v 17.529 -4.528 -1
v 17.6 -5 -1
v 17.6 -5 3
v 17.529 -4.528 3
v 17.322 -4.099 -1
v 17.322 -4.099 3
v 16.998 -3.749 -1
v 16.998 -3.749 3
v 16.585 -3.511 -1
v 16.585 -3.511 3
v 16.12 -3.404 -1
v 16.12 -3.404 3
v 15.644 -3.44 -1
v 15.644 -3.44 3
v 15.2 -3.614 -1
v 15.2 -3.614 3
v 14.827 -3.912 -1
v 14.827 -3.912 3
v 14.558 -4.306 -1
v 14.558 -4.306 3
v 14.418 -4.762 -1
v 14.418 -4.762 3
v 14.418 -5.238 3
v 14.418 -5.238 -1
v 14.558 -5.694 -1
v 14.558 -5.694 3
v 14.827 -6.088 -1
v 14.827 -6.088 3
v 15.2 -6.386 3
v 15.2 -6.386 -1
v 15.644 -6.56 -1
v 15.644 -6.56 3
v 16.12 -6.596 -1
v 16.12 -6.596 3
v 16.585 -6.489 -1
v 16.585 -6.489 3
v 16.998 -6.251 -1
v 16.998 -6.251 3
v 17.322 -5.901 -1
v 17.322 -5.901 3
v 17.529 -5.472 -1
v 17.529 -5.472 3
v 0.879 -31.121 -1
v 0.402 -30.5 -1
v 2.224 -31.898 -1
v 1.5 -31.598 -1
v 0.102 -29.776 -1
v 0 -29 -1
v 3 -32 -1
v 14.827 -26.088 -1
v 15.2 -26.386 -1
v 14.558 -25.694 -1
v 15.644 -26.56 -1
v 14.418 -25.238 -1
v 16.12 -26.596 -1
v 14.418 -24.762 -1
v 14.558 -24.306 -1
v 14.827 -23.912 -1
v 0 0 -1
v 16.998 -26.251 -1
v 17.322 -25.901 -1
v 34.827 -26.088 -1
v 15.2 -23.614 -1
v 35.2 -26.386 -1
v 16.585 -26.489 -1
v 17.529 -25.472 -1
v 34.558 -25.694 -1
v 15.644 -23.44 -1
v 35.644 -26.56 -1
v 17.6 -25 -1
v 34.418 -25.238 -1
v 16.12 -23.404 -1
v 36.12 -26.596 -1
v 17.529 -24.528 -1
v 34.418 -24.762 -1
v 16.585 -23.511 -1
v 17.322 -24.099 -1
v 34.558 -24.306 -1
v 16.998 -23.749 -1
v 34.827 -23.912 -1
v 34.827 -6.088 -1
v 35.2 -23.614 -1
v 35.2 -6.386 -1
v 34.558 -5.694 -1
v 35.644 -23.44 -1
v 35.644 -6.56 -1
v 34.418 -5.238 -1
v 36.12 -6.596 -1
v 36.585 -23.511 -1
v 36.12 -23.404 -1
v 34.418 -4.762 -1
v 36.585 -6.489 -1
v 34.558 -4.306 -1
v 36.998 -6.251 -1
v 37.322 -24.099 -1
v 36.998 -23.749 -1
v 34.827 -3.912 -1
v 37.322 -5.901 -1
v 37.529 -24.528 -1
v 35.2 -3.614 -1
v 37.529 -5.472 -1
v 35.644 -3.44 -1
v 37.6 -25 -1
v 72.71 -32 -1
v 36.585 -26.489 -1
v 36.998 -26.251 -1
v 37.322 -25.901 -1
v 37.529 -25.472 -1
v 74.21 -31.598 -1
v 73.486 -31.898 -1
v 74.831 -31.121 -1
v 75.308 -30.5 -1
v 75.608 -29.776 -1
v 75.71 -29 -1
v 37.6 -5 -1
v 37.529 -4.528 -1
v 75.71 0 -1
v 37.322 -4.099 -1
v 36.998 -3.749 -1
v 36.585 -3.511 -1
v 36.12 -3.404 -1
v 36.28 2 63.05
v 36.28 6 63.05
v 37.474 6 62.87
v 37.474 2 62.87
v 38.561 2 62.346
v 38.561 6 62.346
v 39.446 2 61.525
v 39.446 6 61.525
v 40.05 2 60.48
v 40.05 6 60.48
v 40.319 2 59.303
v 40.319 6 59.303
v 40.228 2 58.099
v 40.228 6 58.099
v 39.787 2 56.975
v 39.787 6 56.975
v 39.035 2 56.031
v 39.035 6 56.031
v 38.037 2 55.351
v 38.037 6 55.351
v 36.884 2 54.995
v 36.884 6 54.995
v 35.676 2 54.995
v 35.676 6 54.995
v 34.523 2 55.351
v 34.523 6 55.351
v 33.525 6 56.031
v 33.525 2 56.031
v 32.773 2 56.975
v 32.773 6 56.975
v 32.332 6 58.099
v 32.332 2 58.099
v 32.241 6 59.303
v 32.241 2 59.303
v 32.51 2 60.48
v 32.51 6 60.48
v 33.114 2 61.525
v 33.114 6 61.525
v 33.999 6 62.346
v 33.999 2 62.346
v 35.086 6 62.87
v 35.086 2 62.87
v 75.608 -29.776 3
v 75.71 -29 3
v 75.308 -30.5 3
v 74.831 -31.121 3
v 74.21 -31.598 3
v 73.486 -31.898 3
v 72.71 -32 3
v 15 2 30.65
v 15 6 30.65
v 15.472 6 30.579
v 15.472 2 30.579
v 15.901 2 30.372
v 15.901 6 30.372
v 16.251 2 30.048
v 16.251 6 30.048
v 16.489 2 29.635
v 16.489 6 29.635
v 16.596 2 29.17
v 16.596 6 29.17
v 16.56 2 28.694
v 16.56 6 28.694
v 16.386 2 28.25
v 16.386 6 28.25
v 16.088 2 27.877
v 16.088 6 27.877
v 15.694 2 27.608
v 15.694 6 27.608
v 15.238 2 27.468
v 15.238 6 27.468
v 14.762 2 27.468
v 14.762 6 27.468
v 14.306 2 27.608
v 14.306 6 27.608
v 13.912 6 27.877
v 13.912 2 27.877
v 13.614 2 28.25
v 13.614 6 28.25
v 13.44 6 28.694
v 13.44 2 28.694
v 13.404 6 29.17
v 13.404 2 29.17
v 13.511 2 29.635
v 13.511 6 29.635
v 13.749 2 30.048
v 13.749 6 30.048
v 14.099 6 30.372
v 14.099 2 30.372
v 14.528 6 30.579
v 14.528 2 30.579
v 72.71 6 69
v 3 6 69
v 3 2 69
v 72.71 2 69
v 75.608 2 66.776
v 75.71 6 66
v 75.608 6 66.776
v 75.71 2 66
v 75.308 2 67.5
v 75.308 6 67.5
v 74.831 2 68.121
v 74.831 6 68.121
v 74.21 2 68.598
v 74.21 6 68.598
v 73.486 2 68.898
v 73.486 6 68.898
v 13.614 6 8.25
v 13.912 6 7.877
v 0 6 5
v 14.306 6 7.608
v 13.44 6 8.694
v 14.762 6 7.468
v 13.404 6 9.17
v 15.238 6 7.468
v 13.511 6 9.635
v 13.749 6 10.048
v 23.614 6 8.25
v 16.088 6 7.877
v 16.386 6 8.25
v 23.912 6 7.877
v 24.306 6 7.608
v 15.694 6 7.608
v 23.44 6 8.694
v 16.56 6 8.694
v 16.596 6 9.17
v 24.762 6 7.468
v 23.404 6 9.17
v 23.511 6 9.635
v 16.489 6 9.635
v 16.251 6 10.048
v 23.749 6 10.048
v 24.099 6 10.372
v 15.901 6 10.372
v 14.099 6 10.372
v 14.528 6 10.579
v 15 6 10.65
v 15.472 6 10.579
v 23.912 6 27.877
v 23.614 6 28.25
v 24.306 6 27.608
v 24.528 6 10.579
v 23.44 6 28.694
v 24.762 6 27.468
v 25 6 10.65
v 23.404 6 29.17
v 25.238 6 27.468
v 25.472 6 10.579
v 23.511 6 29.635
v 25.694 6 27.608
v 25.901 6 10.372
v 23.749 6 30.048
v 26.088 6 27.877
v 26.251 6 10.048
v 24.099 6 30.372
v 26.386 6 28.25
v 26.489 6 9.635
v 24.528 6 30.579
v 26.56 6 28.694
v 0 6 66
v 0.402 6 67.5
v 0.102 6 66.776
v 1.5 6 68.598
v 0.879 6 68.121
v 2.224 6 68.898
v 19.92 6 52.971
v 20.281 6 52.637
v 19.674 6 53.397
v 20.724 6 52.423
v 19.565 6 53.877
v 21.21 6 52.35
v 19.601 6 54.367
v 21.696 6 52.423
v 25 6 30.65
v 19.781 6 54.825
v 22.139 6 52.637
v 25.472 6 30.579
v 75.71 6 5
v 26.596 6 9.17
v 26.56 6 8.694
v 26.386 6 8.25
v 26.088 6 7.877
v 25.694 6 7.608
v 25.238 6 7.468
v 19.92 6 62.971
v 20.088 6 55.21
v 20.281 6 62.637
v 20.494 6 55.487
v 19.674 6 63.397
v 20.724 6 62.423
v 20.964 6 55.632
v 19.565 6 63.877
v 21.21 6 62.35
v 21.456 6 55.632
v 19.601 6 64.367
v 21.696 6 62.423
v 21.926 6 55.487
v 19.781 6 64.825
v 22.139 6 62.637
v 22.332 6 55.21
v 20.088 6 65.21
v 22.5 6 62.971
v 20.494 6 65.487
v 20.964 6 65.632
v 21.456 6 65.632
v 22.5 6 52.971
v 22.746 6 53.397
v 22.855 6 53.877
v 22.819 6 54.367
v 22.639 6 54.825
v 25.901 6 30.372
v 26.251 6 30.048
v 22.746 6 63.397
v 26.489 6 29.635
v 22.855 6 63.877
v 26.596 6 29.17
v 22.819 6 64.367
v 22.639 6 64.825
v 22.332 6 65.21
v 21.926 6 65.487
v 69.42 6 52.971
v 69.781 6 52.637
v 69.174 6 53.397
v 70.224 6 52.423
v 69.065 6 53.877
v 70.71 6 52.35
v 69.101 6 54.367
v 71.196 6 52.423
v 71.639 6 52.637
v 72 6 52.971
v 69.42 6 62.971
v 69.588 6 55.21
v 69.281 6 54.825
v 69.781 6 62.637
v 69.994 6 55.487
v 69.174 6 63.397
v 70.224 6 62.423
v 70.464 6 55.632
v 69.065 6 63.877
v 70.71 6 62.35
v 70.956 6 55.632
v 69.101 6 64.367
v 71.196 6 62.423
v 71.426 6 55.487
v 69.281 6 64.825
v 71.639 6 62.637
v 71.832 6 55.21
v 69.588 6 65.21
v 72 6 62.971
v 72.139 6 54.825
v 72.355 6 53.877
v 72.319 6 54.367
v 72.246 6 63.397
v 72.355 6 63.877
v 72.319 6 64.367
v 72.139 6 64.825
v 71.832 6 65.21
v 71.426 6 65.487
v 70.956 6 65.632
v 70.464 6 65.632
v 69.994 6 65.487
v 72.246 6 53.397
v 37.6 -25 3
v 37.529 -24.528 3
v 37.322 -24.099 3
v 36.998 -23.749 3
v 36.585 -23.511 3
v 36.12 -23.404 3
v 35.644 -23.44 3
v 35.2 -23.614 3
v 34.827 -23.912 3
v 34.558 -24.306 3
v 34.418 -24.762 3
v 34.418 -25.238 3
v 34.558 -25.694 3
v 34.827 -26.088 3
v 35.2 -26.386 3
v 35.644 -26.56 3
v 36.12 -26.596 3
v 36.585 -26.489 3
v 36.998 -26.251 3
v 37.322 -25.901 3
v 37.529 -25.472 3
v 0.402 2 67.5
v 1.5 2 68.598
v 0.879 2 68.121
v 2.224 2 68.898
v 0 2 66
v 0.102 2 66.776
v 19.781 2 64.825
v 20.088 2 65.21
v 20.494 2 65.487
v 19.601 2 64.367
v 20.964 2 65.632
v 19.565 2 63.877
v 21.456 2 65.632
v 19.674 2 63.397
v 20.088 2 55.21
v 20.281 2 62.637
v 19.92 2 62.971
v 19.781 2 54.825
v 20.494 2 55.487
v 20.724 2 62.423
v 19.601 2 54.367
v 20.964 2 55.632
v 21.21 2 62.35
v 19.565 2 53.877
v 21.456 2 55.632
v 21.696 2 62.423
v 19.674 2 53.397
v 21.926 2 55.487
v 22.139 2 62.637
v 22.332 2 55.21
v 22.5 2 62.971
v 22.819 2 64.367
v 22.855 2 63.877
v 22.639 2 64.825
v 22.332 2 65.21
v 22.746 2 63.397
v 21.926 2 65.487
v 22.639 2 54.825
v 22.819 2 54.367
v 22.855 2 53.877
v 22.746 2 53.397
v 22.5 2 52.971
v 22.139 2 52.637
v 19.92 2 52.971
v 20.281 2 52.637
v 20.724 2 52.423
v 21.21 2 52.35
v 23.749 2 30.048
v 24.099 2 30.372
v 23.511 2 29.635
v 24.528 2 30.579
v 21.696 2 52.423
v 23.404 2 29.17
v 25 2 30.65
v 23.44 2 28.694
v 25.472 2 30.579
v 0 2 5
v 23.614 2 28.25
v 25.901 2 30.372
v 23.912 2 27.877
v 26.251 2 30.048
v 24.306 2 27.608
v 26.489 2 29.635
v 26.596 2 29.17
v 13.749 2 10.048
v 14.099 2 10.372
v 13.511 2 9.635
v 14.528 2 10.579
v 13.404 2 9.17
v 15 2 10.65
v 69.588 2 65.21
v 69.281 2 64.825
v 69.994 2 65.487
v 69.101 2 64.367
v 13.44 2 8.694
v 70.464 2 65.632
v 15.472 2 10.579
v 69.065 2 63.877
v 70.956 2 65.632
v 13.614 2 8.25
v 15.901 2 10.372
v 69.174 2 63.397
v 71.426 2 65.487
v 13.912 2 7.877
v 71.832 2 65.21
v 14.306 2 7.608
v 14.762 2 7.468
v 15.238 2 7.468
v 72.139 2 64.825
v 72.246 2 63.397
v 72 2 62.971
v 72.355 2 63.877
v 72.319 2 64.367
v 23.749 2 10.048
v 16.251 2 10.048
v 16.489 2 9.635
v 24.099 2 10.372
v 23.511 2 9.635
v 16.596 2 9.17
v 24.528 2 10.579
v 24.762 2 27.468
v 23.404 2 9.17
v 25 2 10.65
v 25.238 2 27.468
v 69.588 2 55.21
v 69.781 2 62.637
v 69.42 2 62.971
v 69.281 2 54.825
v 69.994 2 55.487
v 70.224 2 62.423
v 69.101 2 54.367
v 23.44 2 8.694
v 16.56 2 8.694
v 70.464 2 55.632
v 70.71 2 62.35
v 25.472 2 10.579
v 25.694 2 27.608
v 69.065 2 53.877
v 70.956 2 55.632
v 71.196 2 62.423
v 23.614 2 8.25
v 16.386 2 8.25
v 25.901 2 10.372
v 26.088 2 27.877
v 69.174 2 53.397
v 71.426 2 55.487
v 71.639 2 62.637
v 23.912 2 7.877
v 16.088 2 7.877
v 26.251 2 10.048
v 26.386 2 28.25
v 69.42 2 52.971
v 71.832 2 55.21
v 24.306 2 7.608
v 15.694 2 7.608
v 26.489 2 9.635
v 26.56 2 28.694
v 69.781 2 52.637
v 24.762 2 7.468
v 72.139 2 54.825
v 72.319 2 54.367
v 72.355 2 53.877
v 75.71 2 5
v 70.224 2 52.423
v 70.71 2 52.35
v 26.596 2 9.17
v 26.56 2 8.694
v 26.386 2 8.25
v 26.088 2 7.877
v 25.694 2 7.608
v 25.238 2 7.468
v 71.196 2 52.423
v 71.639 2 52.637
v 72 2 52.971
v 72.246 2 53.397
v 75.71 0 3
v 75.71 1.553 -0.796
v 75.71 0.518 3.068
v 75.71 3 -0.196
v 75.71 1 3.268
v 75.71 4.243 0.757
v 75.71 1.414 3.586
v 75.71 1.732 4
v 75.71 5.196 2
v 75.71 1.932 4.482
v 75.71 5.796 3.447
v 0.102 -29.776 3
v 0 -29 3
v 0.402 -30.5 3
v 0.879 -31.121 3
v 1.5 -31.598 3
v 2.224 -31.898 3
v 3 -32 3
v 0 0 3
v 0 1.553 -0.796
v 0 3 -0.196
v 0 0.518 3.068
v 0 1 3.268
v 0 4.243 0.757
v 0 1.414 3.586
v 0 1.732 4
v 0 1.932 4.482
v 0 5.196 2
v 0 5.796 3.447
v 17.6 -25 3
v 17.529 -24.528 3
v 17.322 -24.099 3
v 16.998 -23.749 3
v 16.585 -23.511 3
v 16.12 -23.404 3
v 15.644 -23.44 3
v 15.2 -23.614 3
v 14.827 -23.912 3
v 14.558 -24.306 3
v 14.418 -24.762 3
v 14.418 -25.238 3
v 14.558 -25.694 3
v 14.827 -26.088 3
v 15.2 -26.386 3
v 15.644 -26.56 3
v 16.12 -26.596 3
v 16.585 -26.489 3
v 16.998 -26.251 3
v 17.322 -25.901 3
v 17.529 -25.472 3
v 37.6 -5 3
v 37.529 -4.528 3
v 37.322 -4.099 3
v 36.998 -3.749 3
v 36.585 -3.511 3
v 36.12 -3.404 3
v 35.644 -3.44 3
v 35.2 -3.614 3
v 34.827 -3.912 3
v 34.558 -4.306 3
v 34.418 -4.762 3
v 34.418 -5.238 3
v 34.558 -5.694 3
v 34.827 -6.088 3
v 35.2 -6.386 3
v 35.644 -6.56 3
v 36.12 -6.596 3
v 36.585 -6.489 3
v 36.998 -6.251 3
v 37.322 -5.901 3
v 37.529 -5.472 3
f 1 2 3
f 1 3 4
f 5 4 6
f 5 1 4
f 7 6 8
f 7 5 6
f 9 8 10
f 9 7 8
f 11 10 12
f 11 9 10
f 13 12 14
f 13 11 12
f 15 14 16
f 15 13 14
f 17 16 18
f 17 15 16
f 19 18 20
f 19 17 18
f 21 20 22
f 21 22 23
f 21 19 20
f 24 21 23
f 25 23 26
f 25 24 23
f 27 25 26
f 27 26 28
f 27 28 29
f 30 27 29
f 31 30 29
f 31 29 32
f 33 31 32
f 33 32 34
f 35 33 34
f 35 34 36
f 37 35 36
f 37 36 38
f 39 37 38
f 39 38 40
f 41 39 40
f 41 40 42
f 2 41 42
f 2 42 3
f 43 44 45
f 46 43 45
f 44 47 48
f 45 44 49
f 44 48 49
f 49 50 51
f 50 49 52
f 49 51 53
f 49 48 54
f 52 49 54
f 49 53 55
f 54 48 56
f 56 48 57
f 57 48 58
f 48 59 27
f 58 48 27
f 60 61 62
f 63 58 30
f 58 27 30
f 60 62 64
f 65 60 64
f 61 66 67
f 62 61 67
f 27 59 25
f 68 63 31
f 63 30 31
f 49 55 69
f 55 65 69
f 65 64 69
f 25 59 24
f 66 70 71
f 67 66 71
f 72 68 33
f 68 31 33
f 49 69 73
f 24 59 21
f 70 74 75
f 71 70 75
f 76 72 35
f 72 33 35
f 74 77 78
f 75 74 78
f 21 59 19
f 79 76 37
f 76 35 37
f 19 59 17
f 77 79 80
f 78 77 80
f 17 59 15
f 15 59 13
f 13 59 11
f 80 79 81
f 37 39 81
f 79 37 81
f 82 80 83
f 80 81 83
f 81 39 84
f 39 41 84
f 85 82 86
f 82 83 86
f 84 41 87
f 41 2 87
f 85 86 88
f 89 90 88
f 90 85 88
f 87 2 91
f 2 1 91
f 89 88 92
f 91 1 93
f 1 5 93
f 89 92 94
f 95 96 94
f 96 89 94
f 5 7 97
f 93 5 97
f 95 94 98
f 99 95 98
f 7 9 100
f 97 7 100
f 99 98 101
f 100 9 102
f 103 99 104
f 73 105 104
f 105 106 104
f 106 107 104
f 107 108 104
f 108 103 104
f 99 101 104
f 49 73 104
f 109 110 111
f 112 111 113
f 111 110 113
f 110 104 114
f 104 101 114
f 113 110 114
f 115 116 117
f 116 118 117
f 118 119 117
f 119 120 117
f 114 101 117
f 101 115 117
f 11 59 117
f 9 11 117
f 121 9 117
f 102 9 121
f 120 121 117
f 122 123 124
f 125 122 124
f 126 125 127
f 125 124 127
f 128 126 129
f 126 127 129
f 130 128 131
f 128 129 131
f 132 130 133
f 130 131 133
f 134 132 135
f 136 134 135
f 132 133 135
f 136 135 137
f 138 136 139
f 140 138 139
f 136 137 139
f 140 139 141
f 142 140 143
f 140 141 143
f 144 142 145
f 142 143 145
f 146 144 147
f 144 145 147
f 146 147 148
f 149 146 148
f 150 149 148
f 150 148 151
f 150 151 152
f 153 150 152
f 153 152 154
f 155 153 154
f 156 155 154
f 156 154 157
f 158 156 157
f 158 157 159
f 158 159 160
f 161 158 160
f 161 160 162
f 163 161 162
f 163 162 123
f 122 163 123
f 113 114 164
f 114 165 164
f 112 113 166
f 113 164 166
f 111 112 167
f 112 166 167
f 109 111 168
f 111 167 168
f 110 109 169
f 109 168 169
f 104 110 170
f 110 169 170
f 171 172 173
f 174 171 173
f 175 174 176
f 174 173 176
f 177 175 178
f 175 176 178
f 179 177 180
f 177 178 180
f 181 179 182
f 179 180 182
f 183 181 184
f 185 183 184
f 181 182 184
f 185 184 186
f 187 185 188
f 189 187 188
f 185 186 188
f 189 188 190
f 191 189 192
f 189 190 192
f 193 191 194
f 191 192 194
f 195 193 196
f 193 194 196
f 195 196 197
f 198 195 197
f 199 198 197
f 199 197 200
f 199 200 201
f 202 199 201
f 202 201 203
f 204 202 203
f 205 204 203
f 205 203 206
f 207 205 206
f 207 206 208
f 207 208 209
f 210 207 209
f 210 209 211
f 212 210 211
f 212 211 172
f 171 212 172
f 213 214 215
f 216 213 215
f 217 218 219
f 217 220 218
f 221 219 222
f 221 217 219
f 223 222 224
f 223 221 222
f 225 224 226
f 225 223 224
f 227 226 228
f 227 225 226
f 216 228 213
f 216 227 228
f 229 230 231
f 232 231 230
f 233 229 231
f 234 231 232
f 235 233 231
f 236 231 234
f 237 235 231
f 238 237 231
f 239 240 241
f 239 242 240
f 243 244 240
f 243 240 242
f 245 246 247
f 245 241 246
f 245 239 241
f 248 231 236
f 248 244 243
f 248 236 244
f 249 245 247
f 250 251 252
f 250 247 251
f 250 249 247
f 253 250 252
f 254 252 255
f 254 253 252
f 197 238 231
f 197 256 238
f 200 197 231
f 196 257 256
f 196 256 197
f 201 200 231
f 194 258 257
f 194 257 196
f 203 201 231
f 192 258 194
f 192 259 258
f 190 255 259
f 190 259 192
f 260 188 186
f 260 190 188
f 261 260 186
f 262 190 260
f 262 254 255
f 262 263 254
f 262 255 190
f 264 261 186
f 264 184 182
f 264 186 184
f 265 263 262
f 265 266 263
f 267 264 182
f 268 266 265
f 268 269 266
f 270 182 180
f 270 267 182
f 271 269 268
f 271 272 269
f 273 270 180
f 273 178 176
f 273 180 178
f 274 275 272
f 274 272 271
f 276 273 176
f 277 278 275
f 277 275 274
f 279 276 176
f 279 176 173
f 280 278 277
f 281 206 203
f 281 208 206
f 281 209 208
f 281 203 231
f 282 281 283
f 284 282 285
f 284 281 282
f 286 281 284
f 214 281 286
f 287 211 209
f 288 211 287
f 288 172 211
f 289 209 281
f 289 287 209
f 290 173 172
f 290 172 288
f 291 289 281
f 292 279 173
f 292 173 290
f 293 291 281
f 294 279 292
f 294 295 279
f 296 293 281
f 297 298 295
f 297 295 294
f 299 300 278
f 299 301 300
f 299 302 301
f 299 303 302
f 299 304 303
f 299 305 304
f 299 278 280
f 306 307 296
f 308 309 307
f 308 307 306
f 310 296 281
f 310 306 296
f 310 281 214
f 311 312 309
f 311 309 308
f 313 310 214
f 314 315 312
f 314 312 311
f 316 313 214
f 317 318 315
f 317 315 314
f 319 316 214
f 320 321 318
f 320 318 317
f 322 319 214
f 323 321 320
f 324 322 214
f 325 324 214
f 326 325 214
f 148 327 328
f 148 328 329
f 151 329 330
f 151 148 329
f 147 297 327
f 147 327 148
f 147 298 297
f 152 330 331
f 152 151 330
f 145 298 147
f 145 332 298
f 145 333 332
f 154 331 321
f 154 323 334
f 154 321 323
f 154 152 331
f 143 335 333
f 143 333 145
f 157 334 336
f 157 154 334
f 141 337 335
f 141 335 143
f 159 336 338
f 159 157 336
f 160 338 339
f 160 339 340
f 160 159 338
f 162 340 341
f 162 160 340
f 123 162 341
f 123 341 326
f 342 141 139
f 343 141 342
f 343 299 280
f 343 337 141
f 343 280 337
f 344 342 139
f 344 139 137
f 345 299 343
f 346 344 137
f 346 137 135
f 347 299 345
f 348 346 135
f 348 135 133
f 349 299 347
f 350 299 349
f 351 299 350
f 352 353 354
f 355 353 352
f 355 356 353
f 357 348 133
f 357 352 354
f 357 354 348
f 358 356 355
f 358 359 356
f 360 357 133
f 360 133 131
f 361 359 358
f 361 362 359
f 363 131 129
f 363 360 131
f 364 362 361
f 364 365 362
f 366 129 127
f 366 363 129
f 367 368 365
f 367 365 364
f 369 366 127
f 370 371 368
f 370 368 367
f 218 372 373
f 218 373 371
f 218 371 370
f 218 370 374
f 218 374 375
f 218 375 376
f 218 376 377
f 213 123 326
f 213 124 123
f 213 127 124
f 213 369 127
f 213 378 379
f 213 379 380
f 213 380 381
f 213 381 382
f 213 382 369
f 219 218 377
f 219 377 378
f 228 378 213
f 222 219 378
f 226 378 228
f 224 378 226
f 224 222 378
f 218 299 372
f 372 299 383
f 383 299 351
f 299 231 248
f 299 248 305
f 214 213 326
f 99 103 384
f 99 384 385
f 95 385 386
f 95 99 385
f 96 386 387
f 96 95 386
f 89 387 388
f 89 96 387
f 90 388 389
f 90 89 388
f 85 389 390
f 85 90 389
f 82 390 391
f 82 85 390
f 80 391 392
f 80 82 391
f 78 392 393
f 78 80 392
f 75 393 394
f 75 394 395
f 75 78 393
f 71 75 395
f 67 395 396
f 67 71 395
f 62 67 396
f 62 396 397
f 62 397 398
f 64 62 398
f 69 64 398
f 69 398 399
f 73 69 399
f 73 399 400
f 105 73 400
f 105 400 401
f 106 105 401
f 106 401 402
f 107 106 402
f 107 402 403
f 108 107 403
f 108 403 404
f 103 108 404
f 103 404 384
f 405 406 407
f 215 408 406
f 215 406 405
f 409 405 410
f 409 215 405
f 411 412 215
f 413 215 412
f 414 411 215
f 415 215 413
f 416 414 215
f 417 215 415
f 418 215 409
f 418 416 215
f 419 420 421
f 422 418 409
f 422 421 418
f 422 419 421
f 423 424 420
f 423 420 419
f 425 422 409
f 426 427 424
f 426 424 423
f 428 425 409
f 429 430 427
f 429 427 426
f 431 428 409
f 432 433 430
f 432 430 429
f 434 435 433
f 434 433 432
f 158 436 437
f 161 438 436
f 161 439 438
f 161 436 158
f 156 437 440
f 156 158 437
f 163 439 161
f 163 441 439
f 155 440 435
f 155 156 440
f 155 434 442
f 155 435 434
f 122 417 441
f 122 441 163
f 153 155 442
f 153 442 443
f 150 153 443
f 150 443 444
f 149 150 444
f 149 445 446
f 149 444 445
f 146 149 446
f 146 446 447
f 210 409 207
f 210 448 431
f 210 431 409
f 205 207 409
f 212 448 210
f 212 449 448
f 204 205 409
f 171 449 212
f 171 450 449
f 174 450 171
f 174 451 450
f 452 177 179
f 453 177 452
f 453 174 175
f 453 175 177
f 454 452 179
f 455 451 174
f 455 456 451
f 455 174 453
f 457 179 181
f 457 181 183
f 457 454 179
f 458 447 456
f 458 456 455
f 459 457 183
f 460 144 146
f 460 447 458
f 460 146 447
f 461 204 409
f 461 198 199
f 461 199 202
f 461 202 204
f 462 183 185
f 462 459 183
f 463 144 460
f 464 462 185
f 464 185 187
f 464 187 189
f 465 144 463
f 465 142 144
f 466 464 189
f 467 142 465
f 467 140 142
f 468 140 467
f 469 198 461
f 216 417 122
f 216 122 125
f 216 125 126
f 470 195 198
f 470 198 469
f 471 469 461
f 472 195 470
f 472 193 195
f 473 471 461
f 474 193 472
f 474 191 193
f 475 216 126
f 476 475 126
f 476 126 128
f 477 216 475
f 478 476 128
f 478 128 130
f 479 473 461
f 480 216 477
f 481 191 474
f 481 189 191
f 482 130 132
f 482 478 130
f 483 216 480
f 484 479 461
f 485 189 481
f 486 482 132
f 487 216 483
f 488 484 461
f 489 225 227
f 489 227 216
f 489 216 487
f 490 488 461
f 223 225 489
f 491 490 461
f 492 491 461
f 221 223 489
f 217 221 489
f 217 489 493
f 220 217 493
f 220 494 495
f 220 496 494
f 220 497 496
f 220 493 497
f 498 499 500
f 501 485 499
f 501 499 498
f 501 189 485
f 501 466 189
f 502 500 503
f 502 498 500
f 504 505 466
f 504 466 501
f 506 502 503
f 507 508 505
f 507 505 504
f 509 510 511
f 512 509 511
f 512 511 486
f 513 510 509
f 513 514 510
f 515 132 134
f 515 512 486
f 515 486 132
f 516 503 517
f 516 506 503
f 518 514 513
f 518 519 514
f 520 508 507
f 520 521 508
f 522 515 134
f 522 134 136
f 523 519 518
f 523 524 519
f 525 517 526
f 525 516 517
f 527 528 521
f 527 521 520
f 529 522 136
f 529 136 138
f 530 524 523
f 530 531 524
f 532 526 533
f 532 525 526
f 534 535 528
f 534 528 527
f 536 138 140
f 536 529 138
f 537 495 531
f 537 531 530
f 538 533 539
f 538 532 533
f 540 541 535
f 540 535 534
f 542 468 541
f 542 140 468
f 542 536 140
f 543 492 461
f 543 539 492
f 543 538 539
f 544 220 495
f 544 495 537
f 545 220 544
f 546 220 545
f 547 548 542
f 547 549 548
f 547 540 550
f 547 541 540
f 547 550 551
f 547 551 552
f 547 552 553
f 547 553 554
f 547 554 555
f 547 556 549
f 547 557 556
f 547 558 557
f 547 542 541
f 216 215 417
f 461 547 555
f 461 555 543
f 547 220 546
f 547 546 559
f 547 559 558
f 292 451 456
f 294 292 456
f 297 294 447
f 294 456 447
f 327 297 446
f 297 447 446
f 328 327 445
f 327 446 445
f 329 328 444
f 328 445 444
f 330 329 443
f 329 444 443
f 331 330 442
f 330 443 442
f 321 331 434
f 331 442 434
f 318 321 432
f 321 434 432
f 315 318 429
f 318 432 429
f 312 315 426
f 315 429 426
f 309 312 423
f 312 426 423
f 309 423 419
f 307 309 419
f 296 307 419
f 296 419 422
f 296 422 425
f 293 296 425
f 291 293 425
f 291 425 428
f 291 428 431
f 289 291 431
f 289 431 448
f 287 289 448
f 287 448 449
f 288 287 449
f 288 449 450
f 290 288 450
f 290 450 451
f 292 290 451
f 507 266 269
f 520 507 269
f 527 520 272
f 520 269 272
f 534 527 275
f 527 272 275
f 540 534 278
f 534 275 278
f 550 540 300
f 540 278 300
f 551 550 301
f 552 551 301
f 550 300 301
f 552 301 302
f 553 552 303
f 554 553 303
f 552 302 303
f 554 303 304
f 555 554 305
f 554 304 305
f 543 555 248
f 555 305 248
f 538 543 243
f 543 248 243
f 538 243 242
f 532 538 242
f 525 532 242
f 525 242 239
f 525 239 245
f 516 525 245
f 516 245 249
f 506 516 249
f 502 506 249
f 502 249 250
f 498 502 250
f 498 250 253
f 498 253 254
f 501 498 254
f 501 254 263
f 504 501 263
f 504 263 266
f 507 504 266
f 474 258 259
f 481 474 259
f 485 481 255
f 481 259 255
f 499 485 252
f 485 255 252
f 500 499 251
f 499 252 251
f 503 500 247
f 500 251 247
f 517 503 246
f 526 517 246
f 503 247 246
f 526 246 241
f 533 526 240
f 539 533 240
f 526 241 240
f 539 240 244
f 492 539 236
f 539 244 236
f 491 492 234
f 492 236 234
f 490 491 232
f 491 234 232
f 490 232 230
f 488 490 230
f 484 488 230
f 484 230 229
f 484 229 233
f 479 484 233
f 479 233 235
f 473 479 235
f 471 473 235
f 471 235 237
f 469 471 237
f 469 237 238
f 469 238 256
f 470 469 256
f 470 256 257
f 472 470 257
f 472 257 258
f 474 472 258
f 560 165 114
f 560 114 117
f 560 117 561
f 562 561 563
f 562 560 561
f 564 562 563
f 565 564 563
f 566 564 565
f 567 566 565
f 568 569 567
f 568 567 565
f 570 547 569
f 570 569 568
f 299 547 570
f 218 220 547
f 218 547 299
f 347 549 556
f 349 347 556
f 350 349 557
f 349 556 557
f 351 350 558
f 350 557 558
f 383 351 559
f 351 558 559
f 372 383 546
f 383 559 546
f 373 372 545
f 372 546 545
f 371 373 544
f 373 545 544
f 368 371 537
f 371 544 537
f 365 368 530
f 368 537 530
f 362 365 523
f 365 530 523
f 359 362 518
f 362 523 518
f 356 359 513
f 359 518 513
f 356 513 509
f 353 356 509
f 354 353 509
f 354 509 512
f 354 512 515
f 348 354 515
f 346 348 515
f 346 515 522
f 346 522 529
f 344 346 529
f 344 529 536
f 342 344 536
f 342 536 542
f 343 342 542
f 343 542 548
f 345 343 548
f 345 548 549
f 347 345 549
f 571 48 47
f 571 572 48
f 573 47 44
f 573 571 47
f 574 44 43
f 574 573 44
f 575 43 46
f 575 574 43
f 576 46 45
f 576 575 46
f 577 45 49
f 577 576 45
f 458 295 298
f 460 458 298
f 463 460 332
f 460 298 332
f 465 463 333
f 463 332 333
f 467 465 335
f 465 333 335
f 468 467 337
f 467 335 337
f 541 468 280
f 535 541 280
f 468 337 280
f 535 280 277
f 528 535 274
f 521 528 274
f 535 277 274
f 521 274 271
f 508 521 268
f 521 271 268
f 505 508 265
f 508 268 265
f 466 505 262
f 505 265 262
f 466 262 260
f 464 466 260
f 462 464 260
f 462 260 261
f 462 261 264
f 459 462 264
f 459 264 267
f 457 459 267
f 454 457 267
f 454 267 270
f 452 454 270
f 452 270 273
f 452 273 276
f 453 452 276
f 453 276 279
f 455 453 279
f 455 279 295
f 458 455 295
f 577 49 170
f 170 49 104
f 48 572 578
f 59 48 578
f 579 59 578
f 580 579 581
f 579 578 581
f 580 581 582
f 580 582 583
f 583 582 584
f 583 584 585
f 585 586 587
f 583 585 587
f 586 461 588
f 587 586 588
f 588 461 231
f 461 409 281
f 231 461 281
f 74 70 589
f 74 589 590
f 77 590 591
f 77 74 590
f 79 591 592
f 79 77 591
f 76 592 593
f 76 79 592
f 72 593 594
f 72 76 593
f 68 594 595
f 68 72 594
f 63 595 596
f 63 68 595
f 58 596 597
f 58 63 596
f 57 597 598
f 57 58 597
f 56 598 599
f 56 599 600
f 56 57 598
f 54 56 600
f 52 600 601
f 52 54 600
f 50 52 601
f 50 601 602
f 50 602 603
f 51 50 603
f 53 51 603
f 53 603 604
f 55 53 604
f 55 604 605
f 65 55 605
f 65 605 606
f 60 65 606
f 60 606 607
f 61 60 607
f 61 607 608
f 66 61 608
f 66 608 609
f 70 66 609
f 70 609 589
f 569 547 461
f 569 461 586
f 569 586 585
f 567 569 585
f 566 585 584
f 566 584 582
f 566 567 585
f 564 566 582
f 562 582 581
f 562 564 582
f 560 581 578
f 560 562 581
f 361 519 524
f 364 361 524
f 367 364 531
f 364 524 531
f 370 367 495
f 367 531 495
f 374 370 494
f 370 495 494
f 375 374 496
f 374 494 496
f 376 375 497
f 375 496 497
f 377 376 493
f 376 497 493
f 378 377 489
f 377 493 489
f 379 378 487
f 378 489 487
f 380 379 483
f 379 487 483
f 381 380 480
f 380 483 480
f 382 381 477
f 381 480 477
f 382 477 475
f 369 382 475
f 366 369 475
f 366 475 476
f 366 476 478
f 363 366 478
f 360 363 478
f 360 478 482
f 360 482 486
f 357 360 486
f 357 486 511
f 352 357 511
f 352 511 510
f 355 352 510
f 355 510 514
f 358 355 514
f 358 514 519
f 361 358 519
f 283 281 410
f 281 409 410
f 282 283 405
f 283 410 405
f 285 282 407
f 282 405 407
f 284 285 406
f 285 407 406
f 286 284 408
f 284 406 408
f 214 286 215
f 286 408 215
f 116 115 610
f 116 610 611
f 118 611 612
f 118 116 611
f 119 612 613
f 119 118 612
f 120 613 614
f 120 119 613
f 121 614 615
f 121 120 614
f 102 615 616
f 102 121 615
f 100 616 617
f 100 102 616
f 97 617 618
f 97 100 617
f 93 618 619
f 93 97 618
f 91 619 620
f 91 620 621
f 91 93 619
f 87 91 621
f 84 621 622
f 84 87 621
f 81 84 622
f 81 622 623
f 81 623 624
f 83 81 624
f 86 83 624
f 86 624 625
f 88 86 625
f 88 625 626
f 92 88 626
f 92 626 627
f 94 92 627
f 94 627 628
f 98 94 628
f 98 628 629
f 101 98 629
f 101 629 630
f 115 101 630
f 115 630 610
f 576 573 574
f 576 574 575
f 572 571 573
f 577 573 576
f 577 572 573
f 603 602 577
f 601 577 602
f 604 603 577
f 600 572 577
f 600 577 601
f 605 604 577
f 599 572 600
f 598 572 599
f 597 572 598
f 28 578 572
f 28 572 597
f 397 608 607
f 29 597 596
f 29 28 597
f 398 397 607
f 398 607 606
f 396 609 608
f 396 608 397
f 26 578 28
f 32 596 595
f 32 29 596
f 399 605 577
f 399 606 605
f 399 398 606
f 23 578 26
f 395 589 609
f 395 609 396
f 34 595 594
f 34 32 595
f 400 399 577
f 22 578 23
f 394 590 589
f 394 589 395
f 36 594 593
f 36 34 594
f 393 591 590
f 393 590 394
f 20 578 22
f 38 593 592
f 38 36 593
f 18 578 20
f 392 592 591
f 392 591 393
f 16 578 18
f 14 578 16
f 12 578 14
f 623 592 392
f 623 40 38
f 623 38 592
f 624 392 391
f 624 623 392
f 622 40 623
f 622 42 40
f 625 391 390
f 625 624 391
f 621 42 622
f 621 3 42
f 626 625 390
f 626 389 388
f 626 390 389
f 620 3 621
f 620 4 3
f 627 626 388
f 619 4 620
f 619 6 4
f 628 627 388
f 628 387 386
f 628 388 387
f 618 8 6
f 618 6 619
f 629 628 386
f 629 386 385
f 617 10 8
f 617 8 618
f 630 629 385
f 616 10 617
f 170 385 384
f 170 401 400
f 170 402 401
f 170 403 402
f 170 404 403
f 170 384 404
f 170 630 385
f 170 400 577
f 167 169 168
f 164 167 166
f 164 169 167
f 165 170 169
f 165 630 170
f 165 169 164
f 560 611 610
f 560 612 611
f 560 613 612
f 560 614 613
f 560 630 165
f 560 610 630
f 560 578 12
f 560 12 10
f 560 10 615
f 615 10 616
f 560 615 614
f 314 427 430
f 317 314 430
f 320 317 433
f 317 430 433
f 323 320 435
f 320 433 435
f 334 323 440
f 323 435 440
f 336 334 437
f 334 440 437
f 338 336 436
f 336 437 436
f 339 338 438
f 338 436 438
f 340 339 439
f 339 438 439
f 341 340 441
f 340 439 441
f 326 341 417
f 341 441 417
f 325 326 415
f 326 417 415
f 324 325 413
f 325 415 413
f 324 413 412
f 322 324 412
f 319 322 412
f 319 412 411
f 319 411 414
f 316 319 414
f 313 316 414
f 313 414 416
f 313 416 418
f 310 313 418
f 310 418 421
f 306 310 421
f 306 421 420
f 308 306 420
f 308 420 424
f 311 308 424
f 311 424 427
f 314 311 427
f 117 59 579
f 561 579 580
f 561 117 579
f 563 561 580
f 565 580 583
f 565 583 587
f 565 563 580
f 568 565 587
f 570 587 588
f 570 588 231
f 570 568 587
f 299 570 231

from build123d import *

# Parameters (mm, degrees)
SKETCH_1_W              = 75.71
SKETCH_1_H              = 32
SKETCH_1_R              = 1.6
EXTRUDE_1_DEPTH         = 3
SHEET_START             = -1
SHEET_METAL_1_OUTLINE_W = 75.71
SHEET_METAL_1_OUTLINE_H = 32
SHEET_METAL_1_OUTLINE_R = 1.6
SHEET_METAL_1_DEPTH     = 1
SM_EDGE_FLANGE_1_DEPTH  = 75.71
SKETCH_26_R             = 4.05
SKETCH_26_R_2           = 1.6
CUT_EXTRUDE_1_DEPTH     = 10
FILLET_4_R              = 3
M4X0_7_1_D              = 3.3


# Read off the part's stored shape, not the designer's step: 轉換-實體1
# Sheet-metal steps are written as plain solids
with BuildPart() as part:
    # Sketch 1 → 填料-伸長1 (new body)
    with BuildSketch(Plane.XY):
        with Locations((37.855, -16)):
            Rectangle(SKETCH_1_W, SKETCH_1_H)
        with Locations((36, -5)):
            Circle(SKETCH_1_R, mode=Mode.SUBTRACT)
        with Locations((16, -5)):
            Circle(SKETCH_1_R, mode=Mode.SUBTRACT)
        with Locations((16, -25)):
            Circle(SKETCH_1_R, mode=Mode.SUBTRACT)
        with Locations((36, -25)):
            Circle(SKETCH_1_R, mode=Mode.SUBTRACT)
    extrude(amount=EXTRUDE_1_DEPTH)

    # Sheet Metal 1 outline → Sheet Metal 1 (add)
    with BuildSketch(Plane.XY.offset(SHEET_START)):
        with Locations((37.855, -16)):
            Rectangle(SHEET_METAL_1_OUTLINE_W, SHEET_METAL_1_OUTLINE_H)
        with Locations((16, -25)):
            Circle(SHEET_METAL_1_OUTLINE_R, mode=Mode.SUBTRACT)
        with Locations((36, -25)):
            Circle(SHEET_METAL_1_OUTLINE_R, mode=Mode.SUBTRACT)
        with Locations((16, -5)):
            Circle(SHEET_METAL_1_OUTLINE_R, mode=Mode.SUBTRACT)
        with Locations((36, -5)):
            Circle(SHEET_METAL_1_OUTLINE_R, mode=Mode.SUBTRACT)
    extrude(amount=SHEET_METAL_1_DEPTH)

    # 邊線-凸緣1 section (across the edge) → 邊線-凸緣1 (add)
    with BuildSketch(Plane(origin=(75.71, 2, 3), x_dir=(0, -1, 0), z_dir=(-1, 0, 0))):
        with BuildLine():
            Line((-4, 2), (-4, 66))
            Line((-4, 66), (0, 66))
            Line((0, 66), (0, 2))
            ThreePointArc((0, 2), (0.585786438, 0.585786438), (2, 0))
            Line((2, 0), (2, -4))
            ThreePointArc((2, -4), (-2.242640687, -2.242640687), (-4, 2))
        make_face()
    extrude(amount=SM_EDGE_FLANGE_1_DEPTH)

    # 草圖26 → 除料-伸長1 (cut)
    with BuildSketch(Plane(origin=(0, 6, 0), x_dir=(1, 0, 0), z_dir=(0, 1, 0))):
        with Locations(Location((36.28, -59, 0), (0, 0, 270))):
            Circle(SKETCH_26_R)
        with Locations(Location((15, -9.05, 0), (0, 0, 270))):
            Circle(SKETCH_26_R_2)
        with Locations(Location((25, -9.05, 0), (0, 0, 270))):
            Circle(SKETCH_26_R_2)
        with Locations(Location((15, -29.05, 0), (0, 0, 270))):
            Circle(SKETCH_26_R_2)
        with Locations(Location((25, -29.05, 0), (0, 0, 270))):
            Circle(SKETCH_26_R_2)
    extrude(amount=-CUT_EXTRUDE_1_DEPTH, mode=Mode.SUBTRACT)

    # 圓角4
    fillet_4_edges = [part.edges().sort_by_distance(p)[0] for p in [
        (0, -32, 1),
        (75.71, -32, 1),
        (75.71, 4, 69),
        (0, 4, 69),
    ]]
    fillet(fillet_4_edges, radius=FILLET_4_R)

    # M4x0.7 螺紋孔1 (through all)
    with Locations(Plane(origin=(70.71, 6, 54), x_dir=(0, 0, 1), z_dir=(0, 1, 0))):
        with Locations((0, 0), (10, 0), (10, -49.5), (0, -49.5)):
            Hole(M4X0_7_1_D / 2)


solid = part.part
